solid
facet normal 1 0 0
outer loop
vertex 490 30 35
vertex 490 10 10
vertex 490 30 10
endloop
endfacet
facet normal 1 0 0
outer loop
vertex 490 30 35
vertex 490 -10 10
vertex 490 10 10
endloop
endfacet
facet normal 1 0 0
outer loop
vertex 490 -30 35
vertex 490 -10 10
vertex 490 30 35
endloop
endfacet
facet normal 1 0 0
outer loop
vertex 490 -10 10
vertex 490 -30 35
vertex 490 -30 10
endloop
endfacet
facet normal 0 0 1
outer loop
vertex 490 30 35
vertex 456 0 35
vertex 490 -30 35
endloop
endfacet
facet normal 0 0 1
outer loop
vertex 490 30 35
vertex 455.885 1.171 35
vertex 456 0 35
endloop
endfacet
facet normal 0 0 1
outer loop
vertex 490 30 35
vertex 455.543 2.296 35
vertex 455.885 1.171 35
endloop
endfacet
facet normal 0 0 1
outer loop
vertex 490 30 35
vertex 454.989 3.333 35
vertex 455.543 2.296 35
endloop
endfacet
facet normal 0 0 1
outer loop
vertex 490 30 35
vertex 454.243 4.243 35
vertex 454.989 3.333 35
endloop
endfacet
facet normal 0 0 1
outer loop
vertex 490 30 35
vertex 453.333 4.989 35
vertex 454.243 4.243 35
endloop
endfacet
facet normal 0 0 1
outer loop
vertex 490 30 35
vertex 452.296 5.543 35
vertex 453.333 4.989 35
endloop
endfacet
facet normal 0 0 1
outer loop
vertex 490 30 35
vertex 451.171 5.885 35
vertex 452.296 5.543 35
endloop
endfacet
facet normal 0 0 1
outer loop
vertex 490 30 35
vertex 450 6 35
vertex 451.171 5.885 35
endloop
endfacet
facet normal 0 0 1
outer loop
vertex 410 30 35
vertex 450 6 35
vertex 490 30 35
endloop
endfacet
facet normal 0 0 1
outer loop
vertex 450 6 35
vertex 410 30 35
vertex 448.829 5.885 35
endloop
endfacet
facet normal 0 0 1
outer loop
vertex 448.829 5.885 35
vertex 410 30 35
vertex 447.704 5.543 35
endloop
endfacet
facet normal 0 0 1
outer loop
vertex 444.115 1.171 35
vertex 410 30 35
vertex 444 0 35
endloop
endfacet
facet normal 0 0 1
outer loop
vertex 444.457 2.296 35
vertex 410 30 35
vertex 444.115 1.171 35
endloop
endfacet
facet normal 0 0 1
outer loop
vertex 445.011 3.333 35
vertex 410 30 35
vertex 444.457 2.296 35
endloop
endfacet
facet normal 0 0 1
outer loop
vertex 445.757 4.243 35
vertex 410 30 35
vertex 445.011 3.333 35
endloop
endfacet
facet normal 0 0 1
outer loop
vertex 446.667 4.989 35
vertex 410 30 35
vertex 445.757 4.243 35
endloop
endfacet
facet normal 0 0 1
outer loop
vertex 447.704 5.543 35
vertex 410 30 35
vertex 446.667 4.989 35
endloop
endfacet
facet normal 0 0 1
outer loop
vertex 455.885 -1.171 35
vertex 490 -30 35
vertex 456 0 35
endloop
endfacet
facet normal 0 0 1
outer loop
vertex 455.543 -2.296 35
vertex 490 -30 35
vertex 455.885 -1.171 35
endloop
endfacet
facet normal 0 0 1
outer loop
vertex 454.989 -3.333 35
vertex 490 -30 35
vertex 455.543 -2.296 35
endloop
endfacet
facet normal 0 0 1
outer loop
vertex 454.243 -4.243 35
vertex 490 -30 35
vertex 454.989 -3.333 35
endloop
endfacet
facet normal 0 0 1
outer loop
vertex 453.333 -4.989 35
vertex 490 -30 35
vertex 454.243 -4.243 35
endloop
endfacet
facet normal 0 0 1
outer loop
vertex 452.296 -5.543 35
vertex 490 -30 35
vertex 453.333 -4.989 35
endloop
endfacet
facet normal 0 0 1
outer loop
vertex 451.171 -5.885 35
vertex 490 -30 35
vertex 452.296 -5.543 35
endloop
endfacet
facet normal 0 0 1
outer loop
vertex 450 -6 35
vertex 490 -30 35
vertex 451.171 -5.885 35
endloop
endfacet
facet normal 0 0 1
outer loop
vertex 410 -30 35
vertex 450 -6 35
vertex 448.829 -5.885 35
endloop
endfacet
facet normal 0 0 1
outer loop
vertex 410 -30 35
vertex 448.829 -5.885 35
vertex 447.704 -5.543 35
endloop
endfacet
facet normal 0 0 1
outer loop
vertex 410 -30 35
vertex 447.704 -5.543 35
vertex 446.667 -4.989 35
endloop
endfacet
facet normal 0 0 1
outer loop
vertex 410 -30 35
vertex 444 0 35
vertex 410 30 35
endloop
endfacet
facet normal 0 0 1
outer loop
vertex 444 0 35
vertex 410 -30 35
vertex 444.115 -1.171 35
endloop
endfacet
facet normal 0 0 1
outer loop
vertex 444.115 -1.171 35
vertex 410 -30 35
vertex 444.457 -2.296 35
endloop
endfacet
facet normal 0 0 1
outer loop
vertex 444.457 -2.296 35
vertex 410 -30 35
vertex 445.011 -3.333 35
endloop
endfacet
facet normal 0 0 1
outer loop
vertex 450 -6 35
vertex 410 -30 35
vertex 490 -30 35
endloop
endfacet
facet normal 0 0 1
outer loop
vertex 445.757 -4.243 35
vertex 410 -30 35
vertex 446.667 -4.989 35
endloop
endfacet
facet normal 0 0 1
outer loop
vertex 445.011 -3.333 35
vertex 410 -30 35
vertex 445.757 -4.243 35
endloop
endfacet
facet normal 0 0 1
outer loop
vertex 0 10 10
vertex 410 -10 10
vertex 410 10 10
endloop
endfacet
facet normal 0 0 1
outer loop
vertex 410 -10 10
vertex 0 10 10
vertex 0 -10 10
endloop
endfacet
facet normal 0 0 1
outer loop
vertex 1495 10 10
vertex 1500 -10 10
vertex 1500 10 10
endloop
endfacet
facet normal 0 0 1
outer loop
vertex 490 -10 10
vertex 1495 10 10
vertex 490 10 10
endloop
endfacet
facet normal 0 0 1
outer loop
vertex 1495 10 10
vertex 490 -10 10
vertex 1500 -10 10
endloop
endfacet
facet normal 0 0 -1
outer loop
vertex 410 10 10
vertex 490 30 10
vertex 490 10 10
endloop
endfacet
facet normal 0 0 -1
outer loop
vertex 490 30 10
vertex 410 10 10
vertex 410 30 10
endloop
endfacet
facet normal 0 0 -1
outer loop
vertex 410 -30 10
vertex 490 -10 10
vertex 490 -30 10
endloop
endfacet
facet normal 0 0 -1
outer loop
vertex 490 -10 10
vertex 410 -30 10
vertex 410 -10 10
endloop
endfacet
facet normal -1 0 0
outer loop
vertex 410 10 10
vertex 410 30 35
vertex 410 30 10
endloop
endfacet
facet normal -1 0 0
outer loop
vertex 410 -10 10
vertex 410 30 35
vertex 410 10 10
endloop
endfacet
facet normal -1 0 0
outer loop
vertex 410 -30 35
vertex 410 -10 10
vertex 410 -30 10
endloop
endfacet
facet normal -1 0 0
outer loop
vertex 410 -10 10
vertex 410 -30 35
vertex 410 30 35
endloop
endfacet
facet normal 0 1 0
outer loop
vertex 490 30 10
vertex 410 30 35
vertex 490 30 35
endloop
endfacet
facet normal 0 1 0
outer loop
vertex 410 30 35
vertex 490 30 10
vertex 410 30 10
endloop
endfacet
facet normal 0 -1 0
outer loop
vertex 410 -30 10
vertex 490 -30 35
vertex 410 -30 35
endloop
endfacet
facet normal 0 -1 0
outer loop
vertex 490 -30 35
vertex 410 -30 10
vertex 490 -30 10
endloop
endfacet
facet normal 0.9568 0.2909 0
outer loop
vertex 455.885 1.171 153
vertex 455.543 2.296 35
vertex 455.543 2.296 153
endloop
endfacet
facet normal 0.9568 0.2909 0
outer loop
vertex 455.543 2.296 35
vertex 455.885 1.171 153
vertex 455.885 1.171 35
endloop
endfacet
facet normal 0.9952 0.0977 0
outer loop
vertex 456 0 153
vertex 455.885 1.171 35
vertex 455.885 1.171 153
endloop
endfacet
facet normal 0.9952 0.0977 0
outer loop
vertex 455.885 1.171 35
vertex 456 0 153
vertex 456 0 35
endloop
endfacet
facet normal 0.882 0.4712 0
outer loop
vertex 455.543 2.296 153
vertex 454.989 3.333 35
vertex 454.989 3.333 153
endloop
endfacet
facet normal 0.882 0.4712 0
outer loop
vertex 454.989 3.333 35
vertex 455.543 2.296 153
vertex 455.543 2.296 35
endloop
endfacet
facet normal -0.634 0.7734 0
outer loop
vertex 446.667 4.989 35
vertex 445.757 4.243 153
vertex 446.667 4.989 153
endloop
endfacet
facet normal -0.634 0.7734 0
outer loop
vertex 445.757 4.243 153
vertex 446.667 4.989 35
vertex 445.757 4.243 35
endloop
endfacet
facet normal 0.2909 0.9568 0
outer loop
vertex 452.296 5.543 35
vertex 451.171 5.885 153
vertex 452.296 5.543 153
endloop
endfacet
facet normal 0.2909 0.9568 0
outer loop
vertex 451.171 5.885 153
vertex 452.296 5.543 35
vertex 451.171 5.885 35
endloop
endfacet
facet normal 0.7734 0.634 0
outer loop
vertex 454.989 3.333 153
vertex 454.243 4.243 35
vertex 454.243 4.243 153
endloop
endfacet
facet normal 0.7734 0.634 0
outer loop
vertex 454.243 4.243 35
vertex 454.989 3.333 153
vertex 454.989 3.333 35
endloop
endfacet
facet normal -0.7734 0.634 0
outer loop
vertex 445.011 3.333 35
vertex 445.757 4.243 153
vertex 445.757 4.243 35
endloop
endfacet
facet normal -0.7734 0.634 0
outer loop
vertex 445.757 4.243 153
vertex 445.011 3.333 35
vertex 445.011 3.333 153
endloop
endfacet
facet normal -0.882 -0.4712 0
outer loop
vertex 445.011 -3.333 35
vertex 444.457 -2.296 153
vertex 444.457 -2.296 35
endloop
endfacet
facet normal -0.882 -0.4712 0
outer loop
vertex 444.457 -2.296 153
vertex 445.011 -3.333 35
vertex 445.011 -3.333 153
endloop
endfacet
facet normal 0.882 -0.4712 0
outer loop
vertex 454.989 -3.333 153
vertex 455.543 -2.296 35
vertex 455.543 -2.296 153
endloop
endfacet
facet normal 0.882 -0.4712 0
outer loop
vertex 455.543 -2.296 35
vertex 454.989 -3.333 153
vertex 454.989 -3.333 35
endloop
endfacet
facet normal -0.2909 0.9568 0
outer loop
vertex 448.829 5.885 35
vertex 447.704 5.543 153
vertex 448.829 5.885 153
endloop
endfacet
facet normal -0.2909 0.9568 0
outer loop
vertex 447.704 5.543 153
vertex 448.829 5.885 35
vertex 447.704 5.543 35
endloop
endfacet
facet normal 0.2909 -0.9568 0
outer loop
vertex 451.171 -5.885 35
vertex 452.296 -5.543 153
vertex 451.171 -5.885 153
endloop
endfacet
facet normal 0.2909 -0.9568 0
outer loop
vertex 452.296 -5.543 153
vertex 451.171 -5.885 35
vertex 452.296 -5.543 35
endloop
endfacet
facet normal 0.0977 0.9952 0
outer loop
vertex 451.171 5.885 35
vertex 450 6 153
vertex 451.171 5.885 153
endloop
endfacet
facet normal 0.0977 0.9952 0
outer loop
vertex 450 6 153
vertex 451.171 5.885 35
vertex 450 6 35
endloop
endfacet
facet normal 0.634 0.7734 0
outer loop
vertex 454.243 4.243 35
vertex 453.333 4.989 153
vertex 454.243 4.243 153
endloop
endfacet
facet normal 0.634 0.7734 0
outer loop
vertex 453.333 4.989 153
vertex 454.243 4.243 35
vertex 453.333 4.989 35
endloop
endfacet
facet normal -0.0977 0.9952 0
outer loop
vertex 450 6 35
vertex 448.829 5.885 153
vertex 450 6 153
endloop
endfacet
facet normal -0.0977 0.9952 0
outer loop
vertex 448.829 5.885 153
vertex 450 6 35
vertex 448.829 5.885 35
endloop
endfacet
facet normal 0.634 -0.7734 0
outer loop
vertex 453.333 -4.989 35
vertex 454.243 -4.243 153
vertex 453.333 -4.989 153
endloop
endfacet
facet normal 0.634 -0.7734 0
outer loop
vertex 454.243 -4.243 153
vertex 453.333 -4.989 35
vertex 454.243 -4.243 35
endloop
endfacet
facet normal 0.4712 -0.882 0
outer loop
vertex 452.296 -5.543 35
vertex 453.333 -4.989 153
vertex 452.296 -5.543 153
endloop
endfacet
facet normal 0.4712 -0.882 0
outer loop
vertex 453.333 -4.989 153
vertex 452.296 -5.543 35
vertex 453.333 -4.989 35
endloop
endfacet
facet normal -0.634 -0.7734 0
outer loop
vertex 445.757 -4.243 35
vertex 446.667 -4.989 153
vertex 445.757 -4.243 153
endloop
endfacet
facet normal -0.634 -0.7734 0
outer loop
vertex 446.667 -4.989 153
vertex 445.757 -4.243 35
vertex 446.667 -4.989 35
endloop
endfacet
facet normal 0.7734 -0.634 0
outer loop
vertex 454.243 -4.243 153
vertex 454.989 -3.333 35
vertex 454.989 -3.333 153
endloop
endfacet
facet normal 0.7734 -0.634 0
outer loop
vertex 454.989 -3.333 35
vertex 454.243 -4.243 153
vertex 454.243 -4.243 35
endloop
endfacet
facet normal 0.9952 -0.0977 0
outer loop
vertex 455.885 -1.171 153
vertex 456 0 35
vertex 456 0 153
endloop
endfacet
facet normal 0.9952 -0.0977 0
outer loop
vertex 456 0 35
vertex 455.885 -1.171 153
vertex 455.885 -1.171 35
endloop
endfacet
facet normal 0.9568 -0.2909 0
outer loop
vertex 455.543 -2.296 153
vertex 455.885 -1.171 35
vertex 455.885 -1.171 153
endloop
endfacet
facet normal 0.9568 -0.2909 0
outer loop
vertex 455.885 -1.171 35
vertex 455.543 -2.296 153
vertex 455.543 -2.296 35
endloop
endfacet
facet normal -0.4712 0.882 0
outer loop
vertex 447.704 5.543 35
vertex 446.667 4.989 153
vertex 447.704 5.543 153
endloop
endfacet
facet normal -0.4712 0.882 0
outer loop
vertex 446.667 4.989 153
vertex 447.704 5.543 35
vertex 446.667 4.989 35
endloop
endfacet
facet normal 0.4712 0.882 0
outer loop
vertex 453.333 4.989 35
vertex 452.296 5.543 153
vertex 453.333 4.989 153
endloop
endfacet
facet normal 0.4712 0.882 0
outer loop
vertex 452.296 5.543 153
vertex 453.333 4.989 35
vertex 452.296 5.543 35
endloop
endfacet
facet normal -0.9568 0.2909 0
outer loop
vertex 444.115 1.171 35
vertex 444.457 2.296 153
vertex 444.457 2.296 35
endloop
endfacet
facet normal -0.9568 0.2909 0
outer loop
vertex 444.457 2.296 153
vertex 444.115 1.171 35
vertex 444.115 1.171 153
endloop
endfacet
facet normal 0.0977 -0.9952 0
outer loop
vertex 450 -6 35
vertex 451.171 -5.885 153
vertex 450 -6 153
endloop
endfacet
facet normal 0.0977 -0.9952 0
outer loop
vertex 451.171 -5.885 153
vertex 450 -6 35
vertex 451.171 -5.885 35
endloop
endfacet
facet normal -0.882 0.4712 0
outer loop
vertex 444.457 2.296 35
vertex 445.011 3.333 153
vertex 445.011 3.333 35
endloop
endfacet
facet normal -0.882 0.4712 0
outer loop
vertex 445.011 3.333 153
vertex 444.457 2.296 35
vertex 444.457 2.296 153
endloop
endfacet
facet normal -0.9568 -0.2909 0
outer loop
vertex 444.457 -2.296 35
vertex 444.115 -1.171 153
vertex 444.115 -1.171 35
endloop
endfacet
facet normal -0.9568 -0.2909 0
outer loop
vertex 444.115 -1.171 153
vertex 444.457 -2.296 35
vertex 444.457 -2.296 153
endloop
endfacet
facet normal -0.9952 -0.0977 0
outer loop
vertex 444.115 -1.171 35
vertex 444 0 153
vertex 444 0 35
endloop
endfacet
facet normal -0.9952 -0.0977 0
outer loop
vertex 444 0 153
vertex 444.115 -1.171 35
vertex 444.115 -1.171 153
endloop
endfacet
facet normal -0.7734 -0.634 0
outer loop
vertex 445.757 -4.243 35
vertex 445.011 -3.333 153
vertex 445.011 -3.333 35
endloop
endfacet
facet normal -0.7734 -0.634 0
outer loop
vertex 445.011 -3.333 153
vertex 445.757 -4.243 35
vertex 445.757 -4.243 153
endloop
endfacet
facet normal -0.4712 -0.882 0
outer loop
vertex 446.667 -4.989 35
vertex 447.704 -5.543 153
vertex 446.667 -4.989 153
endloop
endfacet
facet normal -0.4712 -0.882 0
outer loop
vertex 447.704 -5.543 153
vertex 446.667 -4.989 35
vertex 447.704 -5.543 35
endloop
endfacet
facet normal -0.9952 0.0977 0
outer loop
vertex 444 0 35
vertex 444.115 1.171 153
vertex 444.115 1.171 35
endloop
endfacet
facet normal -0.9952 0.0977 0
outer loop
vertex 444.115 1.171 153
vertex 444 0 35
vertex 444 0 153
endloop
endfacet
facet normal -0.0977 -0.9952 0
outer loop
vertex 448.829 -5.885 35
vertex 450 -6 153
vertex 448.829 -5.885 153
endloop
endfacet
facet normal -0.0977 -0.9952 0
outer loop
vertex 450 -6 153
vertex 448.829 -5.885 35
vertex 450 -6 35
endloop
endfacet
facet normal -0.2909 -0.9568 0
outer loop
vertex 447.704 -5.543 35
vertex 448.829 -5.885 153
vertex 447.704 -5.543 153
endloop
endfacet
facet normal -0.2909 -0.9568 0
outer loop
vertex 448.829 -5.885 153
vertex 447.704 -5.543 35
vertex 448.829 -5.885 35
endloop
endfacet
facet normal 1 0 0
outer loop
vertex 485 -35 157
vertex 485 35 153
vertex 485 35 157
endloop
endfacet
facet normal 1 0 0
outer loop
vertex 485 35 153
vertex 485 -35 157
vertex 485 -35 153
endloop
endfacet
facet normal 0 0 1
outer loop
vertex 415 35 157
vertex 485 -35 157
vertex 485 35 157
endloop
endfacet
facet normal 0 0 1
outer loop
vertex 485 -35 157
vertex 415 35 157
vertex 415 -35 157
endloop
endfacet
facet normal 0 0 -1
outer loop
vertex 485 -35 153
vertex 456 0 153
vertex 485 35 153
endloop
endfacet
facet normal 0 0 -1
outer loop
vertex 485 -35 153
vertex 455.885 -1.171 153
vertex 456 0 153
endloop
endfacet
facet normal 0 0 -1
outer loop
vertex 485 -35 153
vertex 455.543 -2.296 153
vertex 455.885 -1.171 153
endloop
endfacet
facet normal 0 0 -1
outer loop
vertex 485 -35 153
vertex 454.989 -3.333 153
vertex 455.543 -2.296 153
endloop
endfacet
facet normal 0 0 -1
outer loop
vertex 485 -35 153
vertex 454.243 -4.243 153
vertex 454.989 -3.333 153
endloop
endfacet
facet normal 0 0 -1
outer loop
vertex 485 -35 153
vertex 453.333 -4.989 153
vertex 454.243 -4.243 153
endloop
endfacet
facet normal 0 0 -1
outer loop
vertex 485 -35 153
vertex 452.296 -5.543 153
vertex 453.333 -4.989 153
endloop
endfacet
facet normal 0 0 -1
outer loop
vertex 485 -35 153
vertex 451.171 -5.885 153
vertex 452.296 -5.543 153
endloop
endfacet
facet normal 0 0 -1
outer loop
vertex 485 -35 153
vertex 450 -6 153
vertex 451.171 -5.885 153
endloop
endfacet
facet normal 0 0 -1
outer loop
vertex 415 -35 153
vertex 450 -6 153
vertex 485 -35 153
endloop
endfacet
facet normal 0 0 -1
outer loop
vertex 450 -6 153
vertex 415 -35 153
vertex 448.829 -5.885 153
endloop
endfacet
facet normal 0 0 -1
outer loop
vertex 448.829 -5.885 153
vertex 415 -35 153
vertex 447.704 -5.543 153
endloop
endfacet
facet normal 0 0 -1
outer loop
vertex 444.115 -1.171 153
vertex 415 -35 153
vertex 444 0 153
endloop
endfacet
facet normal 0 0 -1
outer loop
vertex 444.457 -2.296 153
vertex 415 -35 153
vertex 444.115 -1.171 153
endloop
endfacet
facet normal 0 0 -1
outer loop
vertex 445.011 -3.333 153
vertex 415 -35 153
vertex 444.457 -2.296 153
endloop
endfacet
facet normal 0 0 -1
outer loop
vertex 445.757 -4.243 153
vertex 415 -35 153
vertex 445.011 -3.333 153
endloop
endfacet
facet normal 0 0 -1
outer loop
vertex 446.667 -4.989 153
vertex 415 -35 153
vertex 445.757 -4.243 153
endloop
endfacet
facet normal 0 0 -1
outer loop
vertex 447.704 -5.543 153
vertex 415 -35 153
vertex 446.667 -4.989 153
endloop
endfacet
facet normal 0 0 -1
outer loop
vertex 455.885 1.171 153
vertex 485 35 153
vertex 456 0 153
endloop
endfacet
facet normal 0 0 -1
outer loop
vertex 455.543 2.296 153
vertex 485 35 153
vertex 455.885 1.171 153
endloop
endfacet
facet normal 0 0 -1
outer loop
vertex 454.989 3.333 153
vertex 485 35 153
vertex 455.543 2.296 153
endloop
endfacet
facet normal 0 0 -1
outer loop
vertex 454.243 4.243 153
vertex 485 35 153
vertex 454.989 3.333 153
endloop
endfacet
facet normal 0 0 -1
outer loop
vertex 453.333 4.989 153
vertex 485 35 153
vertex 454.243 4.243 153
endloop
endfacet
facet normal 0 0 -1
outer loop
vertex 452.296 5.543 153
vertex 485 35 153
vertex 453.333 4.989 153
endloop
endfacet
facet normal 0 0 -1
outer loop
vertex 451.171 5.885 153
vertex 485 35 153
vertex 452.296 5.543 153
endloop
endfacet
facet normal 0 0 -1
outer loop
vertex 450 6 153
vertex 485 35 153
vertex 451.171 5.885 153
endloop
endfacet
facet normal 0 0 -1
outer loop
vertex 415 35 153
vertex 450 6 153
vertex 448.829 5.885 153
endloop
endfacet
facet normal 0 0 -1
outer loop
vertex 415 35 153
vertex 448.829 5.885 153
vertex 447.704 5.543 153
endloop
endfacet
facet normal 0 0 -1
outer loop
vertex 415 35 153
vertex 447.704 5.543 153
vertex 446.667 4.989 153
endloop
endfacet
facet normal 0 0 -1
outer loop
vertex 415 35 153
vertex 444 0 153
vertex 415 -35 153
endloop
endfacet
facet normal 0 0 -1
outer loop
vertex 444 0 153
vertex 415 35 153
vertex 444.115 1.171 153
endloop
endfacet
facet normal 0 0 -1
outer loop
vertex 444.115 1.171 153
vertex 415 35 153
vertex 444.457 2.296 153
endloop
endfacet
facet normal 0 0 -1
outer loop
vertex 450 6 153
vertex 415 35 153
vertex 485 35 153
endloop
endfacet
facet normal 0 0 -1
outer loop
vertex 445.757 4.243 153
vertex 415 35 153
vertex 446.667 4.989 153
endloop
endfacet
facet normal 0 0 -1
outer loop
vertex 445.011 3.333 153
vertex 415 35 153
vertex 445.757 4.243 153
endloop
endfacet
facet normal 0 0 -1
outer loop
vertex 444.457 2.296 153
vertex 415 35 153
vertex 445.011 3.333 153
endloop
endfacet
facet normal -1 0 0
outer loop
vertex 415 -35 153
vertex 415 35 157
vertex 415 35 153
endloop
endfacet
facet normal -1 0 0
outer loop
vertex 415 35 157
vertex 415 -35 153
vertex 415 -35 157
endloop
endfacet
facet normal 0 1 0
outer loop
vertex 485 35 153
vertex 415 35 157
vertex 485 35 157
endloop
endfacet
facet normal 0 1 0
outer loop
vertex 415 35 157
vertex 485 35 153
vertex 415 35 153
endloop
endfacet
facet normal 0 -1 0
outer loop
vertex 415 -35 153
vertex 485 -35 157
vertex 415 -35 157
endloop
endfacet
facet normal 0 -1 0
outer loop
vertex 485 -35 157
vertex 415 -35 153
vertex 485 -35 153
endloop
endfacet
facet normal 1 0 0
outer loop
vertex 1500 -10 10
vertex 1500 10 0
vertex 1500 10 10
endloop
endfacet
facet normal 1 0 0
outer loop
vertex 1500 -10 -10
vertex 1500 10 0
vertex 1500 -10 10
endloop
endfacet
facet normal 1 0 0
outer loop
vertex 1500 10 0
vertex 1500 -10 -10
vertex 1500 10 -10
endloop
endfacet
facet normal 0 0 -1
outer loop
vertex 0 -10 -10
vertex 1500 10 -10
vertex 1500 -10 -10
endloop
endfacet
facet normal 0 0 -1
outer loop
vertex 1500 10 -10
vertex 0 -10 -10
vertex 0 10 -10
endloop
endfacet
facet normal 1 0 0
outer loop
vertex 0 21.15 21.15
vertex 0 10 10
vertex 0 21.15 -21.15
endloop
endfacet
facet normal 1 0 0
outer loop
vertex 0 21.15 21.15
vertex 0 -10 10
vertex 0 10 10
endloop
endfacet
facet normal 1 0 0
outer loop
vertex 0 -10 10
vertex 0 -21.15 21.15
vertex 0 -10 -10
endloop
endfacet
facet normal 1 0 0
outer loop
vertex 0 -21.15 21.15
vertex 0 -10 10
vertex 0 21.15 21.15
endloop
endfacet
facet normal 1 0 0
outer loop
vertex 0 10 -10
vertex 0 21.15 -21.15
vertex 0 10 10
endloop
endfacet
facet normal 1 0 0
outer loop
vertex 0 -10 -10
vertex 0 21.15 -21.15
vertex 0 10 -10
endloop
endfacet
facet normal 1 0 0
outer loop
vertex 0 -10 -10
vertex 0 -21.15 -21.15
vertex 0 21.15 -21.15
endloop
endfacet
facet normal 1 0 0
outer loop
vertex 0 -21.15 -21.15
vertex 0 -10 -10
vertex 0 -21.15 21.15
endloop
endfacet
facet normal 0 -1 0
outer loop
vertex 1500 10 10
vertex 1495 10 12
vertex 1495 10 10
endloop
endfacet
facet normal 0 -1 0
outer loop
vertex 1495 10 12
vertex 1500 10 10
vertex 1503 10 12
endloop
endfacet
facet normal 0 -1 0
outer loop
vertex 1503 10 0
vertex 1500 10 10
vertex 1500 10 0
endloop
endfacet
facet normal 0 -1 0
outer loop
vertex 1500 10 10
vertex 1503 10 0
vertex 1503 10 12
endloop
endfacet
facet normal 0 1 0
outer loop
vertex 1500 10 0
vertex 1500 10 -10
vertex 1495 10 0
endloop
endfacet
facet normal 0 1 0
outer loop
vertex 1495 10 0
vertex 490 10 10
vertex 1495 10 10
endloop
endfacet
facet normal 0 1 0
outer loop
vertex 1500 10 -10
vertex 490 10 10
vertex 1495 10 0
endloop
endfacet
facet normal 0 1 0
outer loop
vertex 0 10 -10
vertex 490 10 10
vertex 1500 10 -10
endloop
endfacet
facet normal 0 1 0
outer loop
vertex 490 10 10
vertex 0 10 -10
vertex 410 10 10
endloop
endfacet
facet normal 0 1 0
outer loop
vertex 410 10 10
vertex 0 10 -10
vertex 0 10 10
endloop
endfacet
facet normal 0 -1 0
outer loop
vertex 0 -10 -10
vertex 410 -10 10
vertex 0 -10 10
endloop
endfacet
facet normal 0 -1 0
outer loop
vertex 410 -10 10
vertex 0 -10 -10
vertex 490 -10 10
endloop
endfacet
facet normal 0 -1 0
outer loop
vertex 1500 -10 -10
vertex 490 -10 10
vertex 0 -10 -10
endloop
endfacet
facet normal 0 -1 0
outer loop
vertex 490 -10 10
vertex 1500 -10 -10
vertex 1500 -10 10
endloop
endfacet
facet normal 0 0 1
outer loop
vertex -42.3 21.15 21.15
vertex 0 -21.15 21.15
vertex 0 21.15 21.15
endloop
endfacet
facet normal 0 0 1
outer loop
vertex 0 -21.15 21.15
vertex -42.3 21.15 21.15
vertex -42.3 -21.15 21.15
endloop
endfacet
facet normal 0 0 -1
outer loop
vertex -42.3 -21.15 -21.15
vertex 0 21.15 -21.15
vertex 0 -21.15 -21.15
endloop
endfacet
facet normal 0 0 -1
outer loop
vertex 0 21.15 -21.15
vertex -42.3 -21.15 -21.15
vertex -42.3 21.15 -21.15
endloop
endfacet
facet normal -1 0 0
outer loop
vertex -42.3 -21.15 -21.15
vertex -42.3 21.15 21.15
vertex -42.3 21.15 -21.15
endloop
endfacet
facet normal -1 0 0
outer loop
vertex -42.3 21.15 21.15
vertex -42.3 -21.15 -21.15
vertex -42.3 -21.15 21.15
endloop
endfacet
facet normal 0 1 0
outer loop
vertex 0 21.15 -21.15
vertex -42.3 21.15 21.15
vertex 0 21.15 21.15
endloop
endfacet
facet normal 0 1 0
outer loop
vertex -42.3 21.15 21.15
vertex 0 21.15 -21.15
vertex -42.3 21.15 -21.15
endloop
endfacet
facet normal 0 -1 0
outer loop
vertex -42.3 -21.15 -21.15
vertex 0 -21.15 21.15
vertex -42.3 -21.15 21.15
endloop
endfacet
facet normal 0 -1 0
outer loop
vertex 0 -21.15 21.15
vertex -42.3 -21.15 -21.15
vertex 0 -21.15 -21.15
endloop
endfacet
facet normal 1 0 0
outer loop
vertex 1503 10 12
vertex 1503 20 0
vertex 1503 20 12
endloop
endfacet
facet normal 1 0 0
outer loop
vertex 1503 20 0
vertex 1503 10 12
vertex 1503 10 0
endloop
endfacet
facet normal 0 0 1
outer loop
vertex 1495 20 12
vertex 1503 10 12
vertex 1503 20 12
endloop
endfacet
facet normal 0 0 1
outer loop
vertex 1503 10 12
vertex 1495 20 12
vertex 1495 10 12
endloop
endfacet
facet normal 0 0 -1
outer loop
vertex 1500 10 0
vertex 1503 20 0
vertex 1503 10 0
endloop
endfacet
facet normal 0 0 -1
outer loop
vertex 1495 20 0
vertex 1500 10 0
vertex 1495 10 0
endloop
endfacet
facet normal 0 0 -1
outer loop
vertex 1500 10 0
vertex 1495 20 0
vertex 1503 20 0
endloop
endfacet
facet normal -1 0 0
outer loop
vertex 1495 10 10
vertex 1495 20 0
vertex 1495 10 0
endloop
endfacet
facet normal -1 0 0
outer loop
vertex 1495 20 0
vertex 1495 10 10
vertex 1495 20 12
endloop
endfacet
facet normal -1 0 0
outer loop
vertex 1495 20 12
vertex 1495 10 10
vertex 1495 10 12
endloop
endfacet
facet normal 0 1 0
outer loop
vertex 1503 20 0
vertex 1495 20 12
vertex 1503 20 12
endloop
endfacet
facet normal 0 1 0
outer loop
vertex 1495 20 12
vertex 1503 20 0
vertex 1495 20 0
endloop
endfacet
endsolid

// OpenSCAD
// OpenGoldSDR — parametric Rail SAR gantry (OpenSCAD)
// A linear rail that steps an SDR/FMCW antenna along a precise track to synthesize an aperture.
// Edit the params, render (F6), export STL/DXF. For a conversational/text-to-CAD pass use Zoo (zoo.dev)
// or generate CadQuery; this OpenSCAD model is the no-dependency parametric baseline.

/* ---- parameters (mm) ---- */
rail_length     = 1500;   // travel = aperture length; longer = finer cross-range resolution
extrusion       = 20;     // 2020 aluminum extrusion cross-section
carriage_len    = 80;     // antenna carriage block along rail
carriage_w      = 60;
carriage_h      = 25;
antenna_post    = 120;    // height of antenna stand-off above the rail
nema17          = 42.3;   // NEMA17 face size
belt_clear      = 6;      // GT2 belt channel

/* ---- aluminum extrusion rail ---- */
module rail() color("silver")
    translate([0,-extrusion/2,-extrusion/2]) cube([rail_length, extrusion, extrusion]);

/* ---- NEMA17 stepper at the drive end ---- */
module stepper() color("dimgray")
    translate([-nema17, -nema17/2, -nema17/2]) cube([nema17, nema17, nema17]);

/* ---- moving carriage + antenna post ---- */
module carriage(pos=300) color("steelblue") translate([pos,0,0]) {
    translate([-carriage_len/2,-carriage_w/2, extrusion/2]) cube([carriage_len, carriage_w, carriage_h]);
    // antenna stand-off post
    translate([0,0, extrusion/2 + carriage_h])
        cylinder(h=antenna_post, d=12, $fn=32);
    // antenna mount plate (where the SDR horn/can bolts on)
    translate([0,0, extrusion/2 + carriage_h + antenna_post])
        cube([70, 70, 4], center=true);
}

/* ---- end-stop / homing switch (position datum = SAR phase reference) ---- */
module endstop() color("red")
    translate([rail_length-5, extrusion/2, 0]) cube([8, 10, 12]);

rail();
stepper();
carriage(pos = rail_length*0.3);   // change pos to animate a scan step
endstop();

// NOTE: position repeatability at each step IS the measurement. Use a stepper + lead screw or GT2 belt,
// home against the end-stop every run, and log encoder/step count alongside each IQ capture.
